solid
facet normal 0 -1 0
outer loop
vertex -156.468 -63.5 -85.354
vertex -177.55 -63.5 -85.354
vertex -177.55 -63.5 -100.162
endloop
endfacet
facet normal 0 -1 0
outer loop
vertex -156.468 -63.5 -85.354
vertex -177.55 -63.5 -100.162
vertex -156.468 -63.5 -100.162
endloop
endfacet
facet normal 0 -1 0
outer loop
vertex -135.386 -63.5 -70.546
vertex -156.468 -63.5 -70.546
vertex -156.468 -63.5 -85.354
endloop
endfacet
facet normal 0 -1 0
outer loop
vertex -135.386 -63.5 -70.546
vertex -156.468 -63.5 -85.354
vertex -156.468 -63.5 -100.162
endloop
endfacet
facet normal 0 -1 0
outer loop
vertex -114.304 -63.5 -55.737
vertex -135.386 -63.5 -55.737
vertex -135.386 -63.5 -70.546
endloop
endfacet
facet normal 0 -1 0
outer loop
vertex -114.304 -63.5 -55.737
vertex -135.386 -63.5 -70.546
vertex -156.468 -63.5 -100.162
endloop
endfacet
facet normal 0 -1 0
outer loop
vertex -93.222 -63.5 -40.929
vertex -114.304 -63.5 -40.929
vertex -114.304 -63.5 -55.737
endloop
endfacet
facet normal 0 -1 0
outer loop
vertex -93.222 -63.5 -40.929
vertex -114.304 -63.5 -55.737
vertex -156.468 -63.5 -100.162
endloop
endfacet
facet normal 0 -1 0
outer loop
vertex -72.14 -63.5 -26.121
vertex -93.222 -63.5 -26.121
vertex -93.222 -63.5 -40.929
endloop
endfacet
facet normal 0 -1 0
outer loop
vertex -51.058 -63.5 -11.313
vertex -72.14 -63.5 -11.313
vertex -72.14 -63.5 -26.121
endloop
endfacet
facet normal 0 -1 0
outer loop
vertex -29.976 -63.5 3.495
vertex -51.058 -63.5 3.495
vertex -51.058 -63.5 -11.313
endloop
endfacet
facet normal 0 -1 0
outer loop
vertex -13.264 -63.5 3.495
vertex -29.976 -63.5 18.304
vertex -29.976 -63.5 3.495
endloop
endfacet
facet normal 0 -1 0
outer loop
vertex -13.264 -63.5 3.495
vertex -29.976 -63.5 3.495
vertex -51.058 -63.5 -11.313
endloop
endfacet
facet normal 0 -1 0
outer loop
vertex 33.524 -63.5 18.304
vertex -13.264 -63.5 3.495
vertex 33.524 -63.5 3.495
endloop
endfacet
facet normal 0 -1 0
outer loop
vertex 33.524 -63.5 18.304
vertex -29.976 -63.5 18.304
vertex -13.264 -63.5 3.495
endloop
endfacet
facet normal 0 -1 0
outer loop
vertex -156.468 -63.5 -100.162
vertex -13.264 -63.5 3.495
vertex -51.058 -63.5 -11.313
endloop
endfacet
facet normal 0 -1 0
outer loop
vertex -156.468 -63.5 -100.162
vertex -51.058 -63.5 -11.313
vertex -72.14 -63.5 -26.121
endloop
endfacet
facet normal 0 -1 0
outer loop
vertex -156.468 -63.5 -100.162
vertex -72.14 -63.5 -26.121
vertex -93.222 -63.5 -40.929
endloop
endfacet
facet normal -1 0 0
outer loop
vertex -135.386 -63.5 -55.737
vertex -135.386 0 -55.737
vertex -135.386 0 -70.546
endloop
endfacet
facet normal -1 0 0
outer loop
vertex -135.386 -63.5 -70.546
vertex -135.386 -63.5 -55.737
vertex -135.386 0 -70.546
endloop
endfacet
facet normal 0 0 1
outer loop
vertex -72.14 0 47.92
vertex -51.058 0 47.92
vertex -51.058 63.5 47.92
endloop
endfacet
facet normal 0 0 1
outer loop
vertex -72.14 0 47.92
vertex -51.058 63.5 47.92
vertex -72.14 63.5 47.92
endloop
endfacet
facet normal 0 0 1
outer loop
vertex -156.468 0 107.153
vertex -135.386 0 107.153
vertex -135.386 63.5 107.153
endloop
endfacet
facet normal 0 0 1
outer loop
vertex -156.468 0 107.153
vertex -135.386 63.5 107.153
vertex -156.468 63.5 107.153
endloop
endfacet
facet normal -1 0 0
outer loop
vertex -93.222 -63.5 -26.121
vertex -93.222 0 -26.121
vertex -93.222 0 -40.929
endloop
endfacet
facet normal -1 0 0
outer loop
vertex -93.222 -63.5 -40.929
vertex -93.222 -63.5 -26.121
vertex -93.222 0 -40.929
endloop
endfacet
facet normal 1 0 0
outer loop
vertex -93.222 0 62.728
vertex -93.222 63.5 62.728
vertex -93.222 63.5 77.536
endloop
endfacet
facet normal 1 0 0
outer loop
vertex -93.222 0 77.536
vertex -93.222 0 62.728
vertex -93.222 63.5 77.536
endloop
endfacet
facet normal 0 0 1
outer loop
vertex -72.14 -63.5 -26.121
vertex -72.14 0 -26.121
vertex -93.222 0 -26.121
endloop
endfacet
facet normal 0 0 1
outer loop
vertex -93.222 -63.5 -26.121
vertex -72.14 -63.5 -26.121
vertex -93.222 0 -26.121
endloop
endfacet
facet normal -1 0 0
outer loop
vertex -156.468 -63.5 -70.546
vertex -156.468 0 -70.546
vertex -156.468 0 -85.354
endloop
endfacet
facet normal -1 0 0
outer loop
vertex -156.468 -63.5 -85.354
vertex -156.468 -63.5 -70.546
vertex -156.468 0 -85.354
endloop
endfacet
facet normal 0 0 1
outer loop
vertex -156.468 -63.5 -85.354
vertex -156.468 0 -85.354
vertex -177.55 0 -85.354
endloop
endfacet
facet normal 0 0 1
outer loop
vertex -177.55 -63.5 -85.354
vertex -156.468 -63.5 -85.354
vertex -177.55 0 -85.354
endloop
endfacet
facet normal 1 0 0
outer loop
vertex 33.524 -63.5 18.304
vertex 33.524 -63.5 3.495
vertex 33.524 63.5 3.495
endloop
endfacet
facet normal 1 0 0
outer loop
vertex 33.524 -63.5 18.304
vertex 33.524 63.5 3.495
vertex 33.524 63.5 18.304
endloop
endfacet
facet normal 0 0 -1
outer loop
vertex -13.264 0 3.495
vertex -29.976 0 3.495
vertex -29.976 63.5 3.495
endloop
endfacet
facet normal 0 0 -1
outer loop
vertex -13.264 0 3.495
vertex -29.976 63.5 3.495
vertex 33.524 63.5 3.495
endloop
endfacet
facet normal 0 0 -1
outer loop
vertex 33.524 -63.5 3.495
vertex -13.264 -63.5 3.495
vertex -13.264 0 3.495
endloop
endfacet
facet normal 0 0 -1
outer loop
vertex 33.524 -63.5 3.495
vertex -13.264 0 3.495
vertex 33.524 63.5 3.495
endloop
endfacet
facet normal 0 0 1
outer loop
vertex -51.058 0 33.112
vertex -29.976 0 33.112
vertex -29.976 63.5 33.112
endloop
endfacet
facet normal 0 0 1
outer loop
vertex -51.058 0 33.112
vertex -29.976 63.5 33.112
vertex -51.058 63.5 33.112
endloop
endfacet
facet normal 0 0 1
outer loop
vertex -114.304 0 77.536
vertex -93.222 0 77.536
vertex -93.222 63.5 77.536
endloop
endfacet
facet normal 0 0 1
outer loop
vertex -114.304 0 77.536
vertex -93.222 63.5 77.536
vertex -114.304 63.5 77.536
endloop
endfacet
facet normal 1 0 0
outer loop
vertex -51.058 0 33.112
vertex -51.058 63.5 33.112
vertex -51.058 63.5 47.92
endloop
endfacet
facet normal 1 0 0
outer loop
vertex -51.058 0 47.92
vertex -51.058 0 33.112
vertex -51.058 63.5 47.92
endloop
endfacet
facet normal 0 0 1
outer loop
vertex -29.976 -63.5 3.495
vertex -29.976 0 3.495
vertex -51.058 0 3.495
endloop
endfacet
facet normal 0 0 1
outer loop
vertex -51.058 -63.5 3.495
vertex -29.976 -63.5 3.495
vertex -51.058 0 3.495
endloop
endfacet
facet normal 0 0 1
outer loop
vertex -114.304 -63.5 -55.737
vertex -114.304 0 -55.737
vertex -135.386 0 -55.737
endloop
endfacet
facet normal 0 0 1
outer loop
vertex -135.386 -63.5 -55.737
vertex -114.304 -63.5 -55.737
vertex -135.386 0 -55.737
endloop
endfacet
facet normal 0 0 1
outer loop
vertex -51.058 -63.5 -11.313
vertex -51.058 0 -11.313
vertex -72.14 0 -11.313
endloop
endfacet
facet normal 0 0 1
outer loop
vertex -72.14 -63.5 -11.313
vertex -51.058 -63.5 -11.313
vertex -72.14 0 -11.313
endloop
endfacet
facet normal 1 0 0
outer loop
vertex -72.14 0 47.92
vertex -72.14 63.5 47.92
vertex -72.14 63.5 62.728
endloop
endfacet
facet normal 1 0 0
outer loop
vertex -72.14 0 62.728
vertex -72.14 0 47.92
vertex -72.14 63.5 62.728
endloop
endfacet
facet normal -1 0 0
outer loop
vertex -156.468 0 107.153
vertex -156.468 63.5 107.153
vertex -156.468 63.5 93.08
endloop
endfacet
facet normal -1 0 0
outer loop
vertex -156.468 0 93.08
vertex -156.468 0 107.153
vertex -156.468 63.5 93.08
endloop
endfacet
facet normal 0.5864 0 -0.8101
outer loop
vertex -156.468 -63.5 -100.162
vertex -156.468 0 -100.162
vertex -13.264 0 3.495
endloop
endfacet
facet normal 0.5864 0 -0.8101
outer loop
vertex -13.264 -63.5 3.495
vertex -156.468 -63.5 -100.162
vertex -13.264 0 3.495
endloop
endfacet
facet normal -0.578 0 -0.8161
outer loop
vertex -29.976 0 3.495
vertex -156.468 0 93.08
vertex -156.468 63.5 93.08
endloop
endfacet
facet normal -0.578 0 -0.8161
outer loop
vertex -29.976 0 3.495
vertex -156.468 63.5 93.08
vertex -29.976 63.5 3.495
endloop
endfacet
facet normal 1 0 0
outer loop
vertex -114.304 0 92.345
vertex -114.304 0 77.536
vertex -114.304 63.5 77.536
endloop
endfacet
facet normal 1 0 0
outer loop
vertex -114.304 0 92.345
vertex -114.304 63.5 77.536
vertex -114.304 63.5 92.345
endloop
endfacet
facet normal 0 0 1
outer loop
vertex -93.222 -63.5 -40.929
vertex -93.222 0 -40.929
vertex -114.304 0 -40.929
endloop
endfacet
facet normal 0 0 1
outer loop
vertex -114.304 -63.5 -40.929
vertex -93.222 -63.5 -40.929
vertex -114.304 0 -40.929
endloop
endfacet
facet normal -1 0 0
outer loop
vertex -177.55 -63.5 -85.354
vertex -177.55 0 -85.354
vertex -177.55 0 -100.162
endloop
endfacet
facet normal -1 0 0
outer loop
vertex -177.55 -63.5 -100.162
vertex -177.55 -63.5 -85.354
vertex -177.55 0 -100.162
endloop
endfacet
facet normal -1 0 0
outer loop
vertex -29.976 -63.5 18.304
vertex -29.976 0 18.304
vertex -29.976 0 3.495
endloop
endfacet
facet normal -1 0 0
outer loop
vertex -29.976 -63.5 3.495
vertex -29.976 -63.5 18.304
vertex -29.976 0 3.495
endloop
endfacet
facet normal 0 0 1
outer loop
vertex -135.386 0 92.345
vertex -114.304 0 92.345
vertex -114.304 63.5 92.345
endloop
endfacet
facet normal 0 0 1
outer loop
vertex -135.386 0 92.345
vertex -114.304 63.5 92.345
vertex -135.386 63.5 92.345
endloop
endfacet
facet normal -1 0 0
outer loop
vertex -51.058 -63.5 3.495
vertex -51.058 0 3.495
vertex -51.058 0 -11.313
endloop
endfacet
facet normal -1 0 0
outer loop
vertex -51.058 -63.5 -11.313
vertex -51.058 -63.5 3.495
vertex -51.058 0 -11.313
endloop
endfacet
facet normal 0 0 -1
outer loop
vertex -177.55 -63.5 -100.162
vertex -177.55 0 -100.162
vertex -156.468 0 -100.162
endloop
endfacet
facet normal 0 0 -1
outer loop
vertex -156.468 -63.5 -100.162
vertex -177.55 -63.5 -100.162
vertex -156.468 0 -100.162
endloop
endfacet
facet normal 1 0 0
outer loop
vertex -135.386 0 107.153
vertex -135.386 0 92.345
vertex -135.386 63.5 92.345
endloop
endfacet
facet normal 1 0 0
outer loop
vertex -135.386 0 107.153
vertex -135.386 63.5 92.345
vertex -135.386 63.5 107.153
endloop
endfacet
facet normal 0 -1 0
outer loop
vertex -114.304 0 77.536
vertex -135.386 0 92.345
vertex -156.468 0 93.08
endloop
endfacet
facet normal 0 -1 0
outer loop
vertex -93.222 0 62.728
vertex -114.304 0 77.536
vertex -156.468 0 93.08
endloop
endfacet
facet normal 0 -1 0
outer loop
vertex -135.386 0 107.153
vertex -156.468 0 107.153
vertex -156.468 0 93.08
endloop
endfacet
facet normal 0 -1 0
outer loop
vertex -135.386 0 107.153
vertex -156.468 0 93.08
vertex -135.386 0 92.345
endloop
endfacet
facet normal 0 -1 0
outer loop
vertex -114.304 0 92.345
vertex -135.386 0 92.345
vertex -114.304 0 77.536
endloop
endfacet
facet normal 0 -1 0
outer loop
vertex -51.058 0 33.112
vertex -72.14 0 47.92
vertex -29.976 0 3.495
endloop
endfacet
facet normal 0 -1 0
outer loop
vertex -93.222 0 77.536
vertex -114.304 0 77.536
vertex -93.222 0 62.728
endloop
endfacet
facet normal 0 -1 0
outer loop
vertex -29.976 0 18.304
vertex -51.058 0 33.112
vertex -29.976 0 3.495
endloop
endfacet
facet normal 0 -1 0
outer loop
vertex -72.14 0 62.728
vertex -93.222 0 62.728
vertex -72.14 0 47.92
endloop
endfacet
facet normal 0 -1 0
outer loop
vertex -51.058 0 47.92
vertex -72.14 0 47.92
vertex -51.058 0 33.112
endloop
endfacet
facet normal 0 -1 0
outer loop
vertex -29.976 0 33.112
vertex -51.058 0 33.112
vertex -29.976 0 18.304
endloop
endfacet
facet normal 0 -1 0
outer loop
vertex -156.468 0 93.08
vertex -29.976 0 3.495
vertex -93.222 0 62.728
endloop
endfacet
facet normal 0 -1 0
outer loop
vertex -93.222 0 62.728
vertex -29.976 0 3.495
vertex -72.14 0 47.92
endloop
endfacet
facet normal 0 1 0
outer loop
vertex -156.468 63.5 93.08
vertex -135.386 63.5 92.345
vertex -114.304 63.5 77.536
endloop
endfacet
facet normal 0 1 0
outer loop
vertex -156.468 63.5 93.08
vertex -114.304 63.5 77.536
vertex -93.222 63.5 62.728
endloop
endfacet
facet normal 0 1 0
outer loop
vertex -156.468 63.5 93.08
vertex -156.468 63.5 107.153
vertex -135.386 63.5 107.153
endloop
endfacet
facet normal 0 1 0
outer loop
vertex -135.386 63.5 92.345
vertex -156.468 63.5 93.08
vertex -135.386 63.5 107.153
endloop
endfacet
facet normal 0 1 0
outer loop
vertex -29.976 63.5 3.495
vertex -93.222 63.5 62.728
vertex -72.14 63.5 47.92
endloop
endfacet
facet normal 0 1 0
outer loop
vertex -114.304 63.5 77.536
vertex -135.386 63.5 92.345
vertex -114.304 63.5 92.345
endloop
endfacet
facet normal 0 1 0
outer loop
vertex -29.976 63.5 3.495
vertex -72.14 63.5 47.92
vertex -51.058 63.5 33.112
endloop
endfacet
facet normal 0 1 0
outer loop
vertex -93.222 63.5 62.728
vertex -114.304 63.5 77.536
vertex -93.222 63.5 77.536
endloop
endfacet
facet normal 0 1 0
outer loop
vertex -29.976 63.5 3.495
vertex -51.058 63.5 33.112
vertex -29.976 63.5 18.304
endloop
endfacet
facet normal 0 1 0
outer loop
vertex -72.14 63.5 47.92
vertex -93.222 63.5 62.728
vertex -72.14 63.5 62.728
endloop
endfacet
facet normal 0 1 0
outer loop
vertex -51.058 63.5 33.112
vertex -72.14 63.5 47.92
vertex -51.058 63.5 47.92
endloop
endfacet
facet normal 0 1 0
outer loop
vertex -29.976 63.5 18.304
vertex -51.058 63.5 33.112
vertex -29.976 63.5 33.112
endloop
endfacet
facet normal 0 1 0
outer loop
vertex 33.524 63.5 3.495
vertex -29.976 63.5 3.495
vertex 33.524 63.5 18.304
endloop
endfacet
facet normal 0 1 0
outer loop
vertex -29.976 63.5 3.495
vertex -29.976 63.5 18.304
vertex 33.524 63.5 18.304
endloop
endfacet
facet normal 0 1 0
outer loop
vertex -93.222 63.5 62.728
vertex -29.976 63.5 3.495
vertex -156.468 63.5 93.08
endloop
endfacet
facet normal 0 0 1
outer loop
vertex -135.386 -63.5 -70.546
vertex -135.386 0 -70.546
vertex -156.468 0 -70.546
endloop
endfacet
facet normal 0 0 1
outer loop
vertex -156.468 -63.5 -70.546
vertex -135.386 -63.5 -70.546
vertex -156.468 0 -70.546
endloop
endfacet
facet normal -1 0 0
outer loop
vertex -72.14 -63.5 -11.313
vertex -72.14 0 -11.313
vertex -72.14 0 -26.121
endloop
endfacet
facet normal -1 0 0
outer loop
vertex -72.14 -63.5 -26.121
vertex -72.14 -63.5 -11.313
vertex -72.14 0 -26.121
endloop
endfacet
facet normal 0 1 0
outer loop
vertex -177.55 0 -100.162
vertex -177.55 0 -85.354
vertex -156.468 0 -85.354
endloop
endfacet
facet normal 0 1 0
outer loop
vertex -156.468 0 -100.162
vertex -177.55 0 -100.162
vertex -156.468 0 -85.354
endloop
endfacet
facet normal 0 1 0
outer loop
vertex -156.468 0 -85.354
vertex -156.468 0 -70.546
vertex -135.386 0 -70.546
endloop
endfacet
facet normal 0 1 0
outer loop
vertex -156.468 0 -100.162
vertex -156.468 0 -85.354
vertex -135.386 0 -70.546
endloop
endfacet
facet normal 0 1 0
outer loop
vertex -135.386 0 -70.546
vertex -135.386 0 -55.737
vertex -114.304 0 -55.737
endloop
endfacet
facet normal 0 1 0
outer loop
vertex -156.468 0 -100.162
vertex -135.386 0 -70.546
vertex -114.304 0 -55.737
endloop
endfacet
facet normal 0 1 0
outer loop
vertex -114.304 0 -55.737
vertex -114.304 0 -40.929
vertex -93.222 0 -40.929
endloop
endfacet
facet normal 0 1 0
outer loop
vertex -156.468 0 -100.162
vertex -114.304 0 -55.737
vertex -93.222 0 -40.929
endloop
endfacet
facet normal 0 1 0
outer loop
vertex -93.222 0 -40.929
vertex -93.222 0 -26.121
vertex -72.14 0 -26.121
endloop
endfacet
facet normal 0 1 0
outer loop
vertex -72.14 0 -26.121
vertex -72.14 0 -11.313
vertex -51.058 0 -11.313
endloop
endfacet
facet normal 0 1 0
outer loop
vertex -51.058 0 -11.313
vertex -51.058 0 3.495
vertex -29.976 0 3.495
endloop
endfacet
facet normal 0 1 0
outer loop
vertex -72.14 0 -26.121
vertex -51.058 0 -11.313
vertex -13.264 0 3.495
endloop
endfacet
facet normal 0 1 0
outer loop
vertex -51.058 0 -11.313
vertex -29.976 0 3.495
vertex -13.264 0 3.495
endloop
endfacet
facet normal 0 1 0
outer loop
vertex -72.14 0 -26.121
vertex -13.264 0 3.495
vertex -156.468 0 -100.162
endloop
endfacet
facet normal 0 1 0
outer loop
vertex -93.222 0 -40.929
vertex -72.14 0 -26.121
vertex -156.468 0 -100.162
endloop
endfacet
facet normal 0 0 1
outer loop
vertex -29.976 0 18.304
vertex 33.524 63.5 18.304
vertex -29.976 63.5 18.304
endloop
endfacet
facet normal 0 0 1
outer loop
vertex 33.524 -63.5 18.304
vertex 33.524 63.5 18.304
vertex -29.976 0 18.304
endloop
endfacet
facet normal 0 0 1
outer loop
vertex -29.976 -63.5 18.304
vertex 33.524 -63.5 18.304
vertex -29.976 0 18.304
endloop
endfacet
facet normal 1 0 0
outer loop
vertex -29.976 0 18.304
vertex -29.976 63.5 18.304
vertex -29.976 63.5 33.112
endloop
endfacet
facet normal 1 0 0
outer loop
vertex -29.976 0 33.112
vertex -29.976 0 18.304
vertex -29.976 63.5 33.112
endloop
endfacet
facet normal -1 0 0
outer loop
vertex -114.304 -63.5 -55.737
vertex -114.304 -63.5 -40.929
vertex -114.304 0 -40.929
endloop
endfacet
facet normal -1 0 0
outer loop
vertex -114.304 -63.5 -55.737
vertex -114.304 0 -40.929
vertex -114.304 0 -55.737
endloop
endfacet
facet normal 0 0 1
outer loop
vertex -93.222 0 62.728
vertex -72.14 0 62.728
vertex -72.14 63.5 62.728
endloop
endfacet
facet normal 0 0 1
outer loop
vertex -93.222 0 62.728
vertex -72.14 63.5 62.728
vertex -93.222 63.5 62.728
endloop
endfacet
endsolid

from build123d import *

# Parameters (mm, degrees)
F1_DEPTH = 63.5
F2_DEPTH = 63.5


with BuildPart() as f1:
    # F0 (on Front) → F1 (new body)
    with BuildSketch(Plane.XZ):
        Polygon((-177.549966, -85.353864), (-177.549966, -100.162064), (-156.467966, -100.162064), (-13.263665, 3.495336), (-29.975966, 3.495336), (-51.057966, 3.495336), (-51.057966, -11.312864), (-72.139966, -11.312864), (-72.139966, -26.121064), (-93.221966, -26.121064), (-93.221966, -40.929264), (-114.303966, -40.929264), (-114.303966, -55.737464), (-135.385966, -55.737464), (-135.385966, -70.545664), (-156.467966, -70.545664), (-156.467966, -85.353864), align=None)
        Polygon((-29.975966, 3.495336), (-13.263665, 3.495336), (33.524034, 3.495336), (33.524034, 18.303536), (-29.975966, 18.303536), align=None)
    extrude(amount=F1_DEPTH)

    # F0 (on Front) → F2 (join)
    with BuildSketch(Plane.XZ):
        Polygon((-156.467966, 93.080176), (-29.975966, 3.495336), (-29.975966, 18.303536), (-29.975966, 33.111736), (-51.057966, 33.111736), (-51.057966, 47.919936), (-72.139966, 47.919936), (-72.139966, 62.728136), (-93.221966, 62.728136), (-93.221966, 77.536336), (-114.303966, 77.536336), (-114.303966, 92.344536), (-135.385966, 92.344536), (-135.385966, 107.152736), (-156.467966, 107.152736), align=None)
        Polygon((-29.975966, 3.495336), (-13.263665, 3.495336), (33.524034, 3.495336), (33.524034, 18.303536), (-29.975966, 18.303536), align=None)
    extrude(amount=-F2_DEPTH)


solid = f1.part
